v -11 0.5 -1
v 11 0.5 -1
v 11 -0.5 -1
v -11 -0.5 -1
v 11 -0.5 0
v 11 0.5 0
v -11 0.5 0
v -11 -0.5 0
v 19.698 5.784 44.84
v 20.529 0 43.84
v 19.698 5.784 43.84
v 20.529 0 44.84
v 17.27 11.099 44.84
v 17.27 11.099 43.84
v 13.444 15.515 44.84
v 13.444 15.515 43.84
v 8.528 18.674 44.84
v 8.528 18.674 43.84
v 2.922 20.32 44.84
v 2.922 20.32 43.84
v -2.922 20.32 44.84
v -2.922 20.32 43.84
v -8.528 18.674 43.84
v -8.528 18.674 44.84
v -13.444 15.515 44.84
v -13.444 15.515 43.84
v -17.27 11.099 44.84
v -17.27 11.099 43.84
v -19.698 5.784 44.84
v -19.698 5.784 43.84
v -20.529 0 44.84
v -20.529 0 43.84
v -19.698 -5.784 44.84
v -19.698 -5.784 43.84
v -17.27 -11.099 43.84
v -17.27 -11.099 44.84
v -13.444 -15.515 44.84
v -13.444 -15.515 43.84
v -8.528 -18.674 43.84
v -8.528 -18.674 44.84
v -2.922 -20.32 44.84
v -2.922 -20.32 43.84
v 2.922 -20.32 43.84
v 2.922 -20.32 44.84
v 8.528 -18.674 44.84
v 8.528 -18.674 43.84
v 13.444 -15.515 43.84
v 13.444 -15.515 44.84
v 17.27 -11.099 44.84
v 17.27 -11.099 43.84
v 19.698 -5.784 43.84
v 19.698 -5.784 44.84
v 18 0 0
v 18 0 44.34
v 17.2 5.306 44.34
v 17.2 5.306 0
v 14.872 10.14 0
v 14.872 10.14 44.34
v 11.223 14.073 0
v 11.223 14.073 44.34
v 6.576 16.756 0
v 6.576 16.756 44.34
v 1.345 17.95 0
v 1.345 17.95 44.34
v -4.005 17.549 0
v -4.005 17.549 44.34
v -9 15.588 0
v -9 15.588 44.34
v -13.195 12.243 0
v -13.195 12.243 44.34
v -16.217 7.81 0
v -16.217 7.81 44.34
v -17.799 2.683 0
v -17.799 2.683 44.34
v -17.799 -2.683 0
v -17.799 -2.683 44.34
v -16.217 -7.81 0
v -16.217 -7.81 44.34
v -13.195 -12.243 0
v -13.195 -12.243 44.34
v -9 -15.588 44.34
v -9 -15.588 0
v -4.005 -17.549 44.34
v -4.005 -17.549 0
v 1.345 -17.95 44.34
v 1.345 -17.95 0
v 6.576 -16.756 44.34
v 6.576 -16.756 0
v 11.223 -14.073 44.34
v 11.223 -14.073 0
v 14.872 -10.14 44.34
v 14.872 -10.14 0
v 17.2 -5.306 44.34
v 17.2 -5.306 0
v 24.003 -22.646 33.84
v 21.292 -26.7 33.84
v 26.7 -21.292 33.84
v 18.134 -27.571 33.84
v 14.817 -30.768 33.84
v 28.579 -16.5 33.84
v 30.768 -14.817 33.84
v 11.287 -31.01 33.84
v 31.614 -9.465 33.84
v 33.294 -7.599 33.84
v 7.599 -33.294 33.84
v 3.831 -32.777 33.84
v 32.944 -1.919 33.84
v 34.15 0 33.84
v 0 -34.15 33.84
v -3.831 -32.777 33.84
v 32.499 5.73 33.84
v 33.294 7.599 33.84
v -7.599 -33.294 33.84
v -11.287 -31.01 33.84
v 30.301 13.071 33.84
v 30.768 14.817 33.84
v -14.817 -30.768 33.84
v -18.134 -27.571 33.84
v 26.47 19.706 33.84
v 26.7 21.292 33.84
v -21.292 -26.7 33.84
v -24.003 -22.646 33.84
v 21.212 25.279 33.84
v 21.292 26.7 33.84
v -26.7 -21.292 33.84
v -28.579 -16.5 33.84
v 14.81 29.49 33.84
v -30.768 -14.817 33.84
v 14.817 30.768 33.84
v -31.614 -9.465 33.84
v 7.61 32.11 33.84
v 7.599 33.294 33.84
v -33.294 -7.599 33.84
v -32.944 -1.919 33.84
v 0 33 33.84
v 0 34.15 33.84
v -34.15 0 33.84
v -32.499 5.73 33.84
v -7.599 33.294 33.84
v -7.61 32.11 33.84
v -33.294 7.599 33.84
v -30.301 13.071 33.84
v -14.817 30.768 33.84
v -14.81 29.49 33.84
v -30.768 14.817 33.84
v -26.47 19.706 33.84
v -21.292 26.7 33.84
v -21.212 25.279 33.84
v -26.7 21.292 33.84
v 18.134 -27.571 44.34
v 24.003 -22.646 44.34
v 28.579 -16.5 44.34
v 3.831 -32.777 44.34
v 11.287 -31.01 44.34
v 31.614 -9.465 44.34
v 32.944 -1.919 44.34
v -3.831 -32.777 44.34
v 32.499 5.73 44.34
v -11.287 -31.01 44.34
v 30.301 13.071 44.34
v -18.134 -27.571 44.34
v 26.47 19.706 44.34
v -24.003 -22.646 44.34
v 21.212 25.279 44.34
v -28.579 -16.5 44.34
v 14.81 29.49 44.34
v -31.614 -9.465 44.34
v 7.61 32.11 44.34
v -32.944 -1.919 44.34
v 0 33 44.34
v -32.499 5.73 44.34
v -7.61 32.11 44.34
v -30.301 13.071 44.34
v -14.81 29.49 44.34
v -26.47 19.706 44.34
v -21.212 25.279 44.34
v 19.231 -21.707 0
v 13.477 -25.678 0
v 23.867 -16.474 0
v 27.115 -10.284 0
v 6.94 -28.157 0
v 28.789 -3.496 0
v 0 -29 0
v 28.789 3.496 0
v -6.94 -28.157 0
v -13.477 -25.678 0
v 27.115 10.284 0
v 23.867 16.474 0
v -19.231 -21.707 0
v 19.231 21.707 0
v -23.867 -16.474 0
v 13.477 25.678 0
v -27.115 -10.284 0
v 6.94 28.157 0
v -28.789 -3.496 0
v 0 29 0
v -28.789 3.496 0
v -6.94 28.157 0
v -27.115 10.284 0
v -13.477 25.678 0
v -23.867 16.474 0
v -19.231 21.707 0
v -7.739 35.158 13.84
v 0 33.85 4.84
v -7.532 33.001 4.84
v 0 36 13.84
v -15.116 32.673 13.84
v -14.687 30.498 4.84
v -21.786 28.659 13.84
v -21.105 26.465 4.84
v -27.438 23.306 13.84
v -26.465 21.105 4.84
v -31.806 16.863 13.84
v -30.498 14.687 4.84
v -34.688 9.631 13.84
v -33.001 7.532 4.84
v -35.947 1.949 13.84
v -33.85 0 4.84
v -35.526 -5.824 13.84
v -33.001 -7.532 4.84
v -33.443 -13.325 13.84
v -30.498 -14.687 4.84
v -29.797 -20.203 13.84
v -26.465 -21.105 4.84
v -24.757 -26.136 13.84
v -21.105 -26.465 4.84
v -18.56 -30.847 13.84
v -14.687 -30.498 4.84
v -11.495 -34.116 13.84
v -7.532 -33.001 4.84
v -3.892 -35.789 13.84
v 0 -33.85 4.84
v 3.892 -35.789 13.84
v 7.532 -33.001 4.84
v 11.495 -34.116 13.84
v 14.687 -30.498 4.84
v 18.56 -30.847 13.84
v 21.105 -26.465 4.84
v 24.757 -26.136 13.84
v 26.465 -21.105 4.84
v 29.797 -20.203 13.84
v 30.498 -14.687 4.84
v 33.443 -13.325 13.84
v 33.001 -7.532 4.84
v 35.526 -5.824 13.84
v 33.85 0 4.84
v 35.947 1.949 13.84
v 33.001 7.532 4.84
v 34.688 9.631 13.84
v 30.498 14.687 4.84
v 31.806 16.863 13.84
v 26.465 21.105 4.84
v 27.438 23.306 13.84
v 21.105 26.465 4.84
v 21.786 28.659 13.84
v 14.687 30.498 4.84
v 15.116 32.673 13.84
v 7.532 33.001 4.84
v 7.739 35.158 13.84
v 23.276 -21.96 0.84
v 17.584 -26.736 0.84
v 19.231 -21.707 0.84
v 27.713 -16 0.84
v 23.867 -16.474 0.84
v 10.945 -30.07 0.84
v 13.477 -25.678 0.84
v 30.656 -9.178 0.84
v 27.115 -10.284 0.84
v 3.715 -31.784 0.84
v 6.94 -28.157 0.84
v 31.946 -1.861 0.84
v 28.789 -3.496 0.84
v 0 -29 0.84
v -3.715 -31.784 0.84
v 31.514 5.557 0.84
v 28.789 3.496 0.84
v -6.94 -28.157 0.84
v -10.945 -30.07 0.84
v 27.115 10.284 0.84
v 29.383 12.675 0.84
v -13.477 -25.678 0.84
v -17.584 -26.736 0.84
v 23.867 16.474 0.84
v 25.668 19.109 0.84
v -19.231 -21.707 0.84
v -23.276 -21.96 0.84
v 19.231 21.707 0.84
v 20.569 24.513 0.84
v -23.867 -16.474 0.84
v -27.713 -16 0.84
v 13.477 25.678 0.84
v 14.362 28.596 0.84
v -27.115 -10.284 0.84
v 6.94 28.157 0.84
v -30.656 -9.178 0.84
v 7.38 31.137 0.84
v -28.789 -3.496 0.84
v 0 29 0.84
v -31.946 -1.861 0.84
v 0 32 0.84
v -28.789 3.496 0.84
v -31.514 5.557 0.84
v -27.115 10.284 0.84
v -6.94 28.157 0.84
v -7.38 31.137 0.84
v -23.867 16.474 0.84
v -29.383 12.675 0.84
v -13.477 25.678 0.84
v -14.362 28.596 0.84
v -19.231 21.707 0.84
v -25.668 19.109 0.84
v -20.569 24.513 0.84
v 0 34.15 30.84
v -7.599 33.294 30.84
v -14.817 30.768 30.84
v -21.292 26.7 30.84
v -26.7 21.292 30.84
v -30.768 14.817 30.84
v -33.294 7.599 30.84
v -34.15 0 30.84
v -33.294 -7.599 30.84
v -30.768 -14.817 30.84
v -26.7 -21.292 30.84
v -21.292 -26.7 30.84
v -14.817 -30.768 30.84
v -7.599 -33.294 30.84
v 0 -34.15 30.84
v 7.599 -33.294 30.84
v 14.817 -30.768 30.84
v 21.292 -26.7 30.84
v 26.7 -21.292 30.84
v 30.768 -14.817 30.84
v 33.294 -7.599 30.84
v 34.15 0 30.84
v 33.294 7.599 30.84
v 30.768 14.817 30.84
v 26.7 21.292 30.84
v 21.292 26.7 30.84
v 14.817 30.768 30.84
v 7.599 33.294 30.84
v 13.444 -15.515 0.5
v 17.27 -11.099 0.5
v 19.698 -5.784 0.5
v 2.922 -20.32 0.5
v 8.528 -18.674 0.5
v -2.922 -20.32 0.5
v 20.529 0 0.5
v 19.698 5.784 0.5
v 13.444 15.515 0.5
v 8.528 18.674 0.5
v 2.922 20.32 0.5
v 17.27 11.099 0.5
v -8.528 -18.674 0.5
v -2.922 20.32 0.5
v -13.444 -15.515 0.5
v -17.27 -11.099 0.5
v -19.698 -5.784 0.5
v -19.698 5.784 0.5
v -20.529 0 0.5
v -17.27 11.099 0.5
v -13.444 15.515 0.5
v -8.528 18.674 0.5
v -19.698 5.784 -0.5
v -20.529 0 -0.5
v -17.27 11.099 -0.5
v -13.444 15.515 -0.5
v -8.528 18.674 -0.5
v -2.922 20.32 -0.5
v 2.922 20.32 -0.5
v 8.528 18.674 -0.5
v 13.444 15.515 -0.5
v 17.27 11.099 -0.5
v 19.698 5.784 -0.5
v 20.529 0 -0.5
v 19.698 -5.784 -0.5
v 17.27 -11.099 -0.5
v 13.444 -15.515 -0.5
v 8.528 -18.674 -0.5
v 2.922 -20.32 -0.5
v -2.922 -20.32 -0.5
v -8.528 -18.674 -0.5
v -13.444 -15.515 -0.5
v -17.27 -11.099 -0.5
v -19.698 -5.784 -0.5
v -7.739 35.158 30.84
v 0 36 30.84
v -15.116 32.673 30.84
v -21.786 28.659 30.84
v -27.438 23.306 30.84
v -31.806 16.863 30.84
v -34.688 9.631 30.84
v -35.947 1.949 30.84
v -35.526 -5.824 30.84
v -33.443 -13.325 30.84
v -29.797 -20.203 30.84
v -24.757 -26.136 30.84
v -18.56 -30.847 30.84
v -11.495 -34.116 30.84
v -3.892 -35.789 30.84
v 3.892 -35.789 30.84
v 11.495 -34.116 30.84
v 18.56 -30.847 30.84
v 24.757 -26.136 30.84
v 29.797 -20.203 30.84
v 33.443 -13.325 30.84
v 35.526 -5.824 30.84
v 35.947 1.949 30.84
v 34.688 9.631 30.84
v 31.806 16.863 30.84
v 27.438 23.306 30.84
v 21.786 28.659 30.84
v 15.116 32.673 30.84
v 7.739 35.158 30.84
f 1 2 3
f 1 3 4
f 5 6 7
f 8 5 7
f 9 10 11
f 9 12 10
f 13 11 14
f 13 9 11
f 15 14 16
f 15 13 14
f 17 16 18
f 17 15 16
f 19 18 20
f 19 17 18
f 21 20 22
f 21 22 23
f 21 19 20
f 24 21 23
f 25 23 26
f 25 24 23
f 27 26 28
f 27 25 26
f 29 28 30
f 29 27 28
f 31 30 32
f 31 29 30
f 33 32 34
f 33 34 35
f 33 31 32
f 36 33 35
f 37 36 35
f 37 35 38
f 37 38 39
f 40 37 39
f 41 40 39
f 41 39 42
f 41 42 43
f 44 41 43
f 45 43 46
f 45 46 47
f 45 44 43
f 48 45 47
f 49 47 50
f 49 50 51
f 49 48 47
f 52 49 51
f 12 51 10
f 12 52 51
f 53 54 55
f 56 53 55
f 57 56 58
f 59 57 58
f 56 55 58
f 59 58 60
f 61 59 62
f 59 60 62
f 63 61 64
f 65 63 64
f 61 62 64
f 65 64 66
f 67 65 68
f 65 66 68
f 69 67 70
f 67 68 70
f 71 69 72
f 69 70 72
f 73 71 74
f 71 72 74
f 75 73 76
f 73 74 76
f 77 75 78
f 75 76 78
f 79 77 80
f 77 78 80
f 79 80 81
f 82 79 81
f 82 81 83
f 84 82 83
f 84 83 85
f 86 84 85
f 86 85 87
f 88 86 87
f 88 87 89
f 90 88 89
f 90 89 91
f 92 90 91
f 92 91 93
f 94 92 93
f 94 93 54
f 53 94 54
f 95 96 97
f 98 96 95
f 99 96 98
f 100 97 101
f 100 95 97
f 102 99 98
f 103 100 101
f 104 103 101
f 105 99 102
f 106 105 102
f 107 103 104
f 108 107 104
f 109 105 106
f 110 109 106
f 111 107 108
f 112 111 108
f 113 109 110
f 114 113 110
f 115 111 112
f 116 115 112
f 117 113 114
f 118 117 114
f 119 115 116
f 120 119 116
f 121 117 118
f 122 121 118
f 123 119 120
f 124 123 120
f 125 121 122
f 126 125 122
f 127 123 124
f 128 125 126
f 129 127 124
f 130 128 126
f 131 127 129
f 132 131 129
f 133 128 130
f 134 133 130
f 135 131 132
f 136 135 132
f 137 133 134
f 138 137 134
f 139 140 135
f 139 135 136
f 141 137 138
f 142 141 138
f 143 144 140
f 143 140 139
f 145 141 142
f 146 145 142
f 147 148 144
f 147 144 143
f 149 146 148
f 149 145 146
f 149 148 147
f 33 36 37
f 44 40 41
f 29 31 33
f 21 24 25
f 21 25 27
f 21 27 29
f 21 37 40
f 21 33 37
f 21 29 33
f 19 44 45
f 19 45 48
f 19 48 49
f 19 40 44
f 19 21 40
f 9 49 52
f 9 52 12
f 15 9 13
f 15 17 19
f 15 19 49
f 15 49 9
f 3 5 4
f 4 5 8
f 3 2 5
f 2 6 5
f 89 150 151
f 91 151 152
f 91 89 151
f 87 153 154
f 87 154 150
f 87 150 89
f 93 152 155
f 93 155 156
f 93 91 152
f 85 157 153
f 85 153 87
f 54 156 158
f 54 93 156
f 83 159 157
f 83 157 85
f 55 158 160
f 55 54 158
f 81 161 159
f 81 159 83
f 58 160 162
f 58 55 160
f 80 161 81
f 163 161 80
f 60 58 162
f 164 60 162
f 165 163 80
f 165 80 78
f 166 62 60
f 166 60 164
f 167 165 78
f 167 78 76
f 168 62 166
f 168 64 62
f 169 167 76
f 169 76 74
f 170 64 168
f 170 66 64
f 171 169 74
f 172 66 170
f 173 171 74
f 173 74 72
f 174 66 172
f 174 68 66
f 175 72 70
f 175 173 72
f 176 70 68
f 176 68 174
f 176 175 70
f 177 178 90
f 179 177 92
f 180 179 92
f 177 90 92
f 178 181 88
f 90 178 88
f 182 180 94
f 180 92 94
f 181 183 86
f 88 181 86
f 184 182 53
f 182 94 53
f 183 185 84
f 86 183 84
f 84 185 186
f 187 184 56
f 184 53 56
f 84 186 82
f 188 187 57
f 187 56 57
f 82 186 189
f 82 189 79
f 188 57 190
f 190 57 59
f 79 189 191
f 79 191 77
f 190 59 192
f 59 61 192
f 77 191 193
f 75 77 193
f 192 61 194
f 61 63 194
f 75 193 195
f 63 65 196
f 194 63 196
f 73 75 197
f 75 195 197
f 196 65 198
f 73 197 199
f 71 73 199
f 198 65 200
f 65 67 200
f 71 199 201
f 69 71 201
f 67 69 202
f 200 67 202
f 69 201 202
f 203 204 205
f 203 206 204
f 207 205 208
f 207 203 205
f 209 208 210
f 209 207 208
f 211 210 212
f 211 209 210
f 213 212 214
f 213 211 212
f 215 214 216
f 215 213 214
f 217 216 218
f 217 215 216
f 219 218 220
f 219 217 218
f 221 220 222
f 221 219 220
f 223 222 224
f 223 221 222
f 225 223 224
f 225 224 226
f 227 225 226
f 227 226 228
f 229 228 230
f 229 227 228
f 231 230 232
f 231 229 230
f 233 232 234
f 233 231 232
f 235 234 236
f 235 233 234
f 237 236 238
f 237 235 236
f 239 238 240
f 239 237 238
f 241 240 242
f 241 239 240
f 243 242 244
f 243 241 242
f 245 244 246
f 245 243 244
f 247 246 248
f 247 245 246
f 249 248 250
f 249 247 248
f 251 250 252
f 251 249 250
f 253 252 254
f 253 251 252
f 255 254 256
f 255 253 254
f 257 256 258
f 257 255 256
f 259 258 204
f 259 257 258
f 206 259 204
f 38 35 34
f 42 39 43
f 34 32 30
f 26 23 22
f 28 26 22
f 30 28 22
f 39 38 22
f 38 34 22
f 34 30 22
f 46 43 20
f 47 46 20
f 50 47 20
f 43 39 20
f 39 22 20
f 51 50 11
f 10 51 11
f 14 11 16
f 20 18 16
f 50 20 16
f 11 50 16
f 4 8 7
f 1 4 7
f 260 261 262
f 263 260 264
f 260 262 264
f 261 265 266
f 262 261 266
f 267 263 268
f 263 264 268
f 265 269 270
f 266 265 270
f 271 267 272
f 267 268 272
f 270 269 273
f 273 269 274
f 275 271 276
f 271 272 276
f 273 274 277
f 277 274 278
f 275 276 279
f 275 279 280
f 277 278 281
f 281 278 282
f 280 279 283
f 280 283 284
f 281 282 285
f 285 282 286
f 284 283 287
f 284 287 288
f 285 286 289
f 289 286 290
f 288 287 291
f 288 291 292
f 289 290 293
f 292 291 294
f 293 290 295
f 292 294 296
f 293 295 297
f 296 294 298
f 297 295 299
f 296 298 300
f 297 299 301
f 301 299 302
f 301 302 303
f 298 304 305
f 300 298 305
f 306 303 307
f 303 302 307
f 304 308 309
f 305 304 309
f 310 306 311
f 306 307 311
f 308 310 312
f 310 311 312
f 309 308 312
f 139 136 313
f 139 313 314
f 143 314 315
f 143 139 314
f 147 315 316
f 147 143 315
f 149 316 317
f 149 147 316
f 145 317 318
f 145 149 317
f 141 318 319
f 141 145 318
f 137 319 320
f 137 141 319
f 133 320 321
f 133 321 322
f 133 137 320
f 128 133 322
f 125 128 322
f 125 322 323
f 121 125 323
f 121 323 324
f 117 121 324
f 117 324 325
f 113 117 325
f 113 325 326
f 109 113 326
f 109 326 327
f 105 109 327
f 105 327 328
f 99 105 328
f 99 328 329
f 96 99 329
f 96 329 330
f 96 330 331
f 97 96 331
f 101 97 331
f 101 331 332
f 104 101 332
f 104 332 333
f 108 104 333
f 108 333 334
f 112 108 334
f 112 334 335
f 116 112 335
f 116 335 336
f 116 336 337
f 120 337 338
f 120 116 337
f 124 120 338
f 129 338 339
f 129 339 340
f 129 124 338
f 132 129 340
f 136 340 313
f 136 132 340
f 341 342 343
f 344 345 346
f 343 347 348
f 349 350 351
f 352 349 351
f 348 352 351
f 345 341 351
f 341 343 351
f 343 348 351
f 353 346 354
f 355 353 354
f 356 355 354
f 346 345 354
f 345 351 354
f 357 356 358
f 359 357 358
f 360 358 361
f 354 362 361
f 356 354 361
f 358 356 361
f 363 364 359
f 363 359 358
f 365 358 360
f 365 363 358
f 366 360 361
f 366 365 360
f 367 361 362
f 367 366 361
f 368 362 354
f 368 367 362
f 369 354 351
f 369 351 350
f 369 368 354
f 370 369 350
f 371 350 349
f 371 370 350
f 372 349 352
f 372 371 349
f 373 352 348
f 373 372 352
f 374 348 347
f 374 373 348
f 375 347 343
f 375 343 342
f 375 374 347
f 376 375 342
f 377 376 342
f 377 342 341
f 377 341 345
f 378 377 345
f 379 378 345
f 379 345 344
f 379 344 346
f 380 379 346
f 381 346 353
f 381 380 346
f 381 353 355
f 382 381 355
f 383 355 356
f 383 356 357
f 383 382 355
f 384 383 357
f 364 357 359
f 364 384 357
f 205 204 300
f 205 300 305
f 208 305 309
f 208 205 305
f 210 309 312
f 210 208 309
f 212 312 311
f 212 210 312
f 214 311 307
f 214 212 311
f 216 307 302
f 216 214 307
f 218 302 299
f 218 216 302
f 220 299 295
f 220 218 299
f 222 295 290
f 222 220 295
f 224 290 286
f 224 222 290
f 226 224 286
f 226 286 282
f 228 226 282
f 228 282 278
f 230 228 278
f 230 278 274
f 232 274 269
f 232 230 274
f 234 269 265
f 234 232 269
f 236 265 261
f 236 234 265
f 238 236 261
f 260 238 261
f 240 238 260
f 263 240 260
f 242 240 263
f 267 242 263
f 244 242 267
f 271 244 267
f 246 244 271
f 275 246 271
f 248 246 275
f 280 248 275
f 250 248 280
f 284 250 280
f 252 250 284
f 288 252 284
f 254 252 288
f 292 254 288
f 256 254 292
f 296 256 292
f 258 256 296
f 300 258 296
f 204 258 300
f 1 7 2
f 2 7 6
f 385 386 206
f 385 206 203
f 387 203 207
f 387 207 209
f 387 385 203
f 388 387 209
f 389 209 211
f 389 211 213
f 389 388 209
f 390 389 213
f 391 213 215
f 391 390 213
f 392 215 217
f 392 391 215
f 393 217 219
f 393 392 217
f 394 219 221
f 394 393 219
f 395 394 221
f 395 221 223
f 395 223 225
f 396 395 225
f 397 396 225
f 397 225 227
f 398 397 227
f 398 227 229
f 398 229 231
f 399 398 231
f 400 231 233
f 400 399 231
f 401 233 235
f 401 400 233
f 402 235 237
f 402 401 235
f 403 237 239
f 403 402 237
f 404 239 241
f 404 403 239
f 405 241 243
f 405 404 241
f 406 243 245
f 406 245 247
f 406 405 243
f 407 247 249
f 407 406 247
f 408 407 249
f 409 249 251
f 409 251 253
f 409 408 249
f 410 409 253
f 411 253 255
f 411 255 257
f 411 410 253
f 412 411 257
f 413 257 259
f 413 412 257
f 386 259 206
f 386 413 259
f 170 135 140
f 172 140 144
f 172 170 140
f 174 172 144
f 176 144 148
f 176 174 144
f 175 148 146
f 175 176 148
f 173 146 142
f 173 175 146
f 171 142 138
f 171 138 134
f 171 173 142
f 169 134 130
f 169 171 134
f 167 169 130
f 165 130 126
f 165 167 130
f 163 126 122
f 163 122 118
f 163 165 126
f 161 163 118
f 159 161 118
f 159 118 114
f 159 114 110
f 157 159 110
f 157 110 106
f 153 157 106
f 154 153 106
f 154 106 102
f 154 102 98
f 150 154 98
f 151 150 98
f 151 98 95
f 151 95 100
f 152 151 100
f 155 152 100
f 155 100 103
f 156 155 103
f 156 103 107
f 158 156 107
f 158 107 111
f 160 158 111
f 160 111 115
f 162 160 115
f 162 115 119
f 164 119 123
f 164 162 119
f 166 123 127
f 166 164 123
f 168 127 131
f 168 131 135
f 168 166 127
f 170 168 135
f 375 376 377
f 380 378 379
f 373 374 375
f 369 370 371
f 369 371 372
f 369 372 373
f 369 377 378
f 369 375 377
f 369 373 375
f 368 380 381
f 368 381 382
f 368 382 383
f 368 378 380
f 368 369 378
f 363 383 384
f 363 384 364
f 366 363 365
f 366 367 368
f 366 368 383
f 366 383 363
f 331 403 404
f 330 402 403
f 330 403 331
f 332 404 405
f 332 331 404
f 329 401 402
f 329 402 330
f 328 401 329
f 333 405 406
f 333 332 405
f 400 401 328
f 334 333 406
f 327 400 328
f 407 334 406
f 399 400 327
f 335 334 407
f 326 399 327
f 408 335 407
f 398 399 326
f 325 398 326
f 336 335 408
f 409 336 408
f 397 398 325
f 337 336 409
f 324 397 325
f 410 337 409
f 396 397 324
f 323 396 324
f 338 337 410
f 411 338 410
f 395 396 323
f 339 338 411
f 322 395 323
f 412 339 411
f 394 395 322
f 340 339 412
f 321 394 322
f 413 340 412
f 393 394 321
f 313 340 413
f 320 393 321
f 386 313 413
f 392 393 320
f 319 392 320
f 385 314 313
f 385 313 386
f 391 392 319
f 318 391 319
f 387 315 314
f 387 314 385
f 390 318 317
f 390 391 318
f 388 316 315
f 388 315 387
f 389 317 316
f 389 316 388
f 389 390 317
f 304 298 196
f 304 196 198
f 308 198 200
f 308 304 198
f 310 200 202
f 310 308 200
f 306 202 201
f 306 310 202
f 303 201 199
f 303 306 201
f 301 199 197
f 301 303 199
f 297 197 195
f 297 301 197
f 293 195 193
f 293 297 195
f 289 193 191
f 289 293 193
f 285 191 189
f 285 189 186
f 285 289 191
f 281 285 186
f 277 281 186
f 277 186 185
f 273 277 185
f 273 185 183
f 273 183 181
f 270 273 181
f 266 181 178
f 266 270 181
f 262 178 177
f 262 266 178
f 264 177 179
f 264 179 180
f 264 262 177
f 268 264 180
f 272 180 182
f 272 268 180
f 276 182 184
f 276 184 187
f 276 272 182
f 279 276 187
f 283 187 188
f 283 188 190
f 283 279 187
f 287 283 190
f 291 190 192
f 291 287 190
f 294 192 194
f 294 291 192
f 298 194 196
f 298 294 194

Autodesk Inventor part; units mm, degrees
ref_plane "YZ Plane" through (0, 0, 0) normal (1, 0, 0) x (0, 1, 0)
ref_plane "XZ Plane" through (0, 0, 0) normal (0, 1, 0) x (-1, 0, 0)
ref_plane "XY Plane" through (0, 0, 0) normal (0, 0, 1) x (1, 0, 0)
sketch "Sketch1" plane through (0, 0, 0) normal (1, 0, 0) x (0, 1, 0)
  line L0 (0, -8.868) -> (0, 53.208) construction
  line L1 (-7.2, 0) -> (43.2, 0) construction
  line L2 (0, 0) -> (29, 0)
  line L3 (29, 0) -> (29, 0.84)
  line L4 (29, 0.84) -> (32, 0.84)
  line L5 (32, 0.84) -> (33.85, 4.84)
  line L6 (33.85, 4.84) -> (36, 13.84)
  line L7 (36, 13.84) -> (36, 30.84)
  line L8 (36, 30.84) -> (34.15, 30.84)
  line L9 (34.15, 30.84) -> (34.15, 33.84)
  line L10 (34.15, 33.84) -> (33, 33.84)
  line L11 (33, 33.84) -> (33, 44.34)
  line L12 (33, 44.34) -> (0, 44.34)
  line L13 (0, 44.34) -> (0, 0)
  dimension "d2" = 58
  dimension "d3" = 0.84
  dimension "d5" = 64
  dimension "d6" = 4
  dimension "d7" = 67.7
  dimension "d8" = 72
  dimension "d9" = 9
  dimension "d10" = 17
  dimension "d11" = 3
  dimension "d12" = 68.3
  dimension "d13" = 10.5
  dimension "d14" = 66
revolve "Revolution1" add sketch "Sketch1" angle 360 about axis through (0, 0, -10) along (0, 0, 1)
sketch "Sketch4" plane through (0, 0, 44.34) normal (0, 0, 1) x (1, 0, 0)
  circle A0 centre (0, 0) radius 18
  dimension "d19" = 36
extrude "Extrusion1" cut sketch "Sketch4" against normal up to next
sketch "Sketch6" plane through (0, 0, 0) normal (0, 0, -1) x (-1, 0, 0)
  circle A0 centre (0, 0) radius 20.5291
extrude "Extrusion: Lens Imitation" add sketch "Sketch6" against normal mid plane 1 separate body
sketch "Sketch7" plane through (0, 0, 44.34) normal (0, 0, 1) x (1, 0, 0)
  circle A0 centre (0, 0) radius 20.5291
extrude "Extrusion: Lens imitation 1" add sketch "Sketch7" against normal mid plane 1 separate body
sketch "Sketch8" plane through (0, 0, -0.5) normal (0, 0, -1) x (-1, 0, 0)
  line L0 (11, 0.5) -> (-11, 0.5)
  line L1 (-11, 0.5) -> (-11, -0.5)
  line L2 (-11, -0.5) -> (11, -0.5)
  line L3 (11, -0.5) -> (11, 0.5)
  line L4 (11, 0.5) -> (-11, -0.5) construction
  line L5 (-11, 0.5) -> (11, -0.5) construction
  point P0 (0, 0)
  dimension "d28" = 22
  dimension "d29" = 1
extrude "Extrusion5" add sketch "Sketch8" along normal mid plane 1 separate body
properties part number "50mm_1_4G_body_disassembled" material "Iron, Cast"
